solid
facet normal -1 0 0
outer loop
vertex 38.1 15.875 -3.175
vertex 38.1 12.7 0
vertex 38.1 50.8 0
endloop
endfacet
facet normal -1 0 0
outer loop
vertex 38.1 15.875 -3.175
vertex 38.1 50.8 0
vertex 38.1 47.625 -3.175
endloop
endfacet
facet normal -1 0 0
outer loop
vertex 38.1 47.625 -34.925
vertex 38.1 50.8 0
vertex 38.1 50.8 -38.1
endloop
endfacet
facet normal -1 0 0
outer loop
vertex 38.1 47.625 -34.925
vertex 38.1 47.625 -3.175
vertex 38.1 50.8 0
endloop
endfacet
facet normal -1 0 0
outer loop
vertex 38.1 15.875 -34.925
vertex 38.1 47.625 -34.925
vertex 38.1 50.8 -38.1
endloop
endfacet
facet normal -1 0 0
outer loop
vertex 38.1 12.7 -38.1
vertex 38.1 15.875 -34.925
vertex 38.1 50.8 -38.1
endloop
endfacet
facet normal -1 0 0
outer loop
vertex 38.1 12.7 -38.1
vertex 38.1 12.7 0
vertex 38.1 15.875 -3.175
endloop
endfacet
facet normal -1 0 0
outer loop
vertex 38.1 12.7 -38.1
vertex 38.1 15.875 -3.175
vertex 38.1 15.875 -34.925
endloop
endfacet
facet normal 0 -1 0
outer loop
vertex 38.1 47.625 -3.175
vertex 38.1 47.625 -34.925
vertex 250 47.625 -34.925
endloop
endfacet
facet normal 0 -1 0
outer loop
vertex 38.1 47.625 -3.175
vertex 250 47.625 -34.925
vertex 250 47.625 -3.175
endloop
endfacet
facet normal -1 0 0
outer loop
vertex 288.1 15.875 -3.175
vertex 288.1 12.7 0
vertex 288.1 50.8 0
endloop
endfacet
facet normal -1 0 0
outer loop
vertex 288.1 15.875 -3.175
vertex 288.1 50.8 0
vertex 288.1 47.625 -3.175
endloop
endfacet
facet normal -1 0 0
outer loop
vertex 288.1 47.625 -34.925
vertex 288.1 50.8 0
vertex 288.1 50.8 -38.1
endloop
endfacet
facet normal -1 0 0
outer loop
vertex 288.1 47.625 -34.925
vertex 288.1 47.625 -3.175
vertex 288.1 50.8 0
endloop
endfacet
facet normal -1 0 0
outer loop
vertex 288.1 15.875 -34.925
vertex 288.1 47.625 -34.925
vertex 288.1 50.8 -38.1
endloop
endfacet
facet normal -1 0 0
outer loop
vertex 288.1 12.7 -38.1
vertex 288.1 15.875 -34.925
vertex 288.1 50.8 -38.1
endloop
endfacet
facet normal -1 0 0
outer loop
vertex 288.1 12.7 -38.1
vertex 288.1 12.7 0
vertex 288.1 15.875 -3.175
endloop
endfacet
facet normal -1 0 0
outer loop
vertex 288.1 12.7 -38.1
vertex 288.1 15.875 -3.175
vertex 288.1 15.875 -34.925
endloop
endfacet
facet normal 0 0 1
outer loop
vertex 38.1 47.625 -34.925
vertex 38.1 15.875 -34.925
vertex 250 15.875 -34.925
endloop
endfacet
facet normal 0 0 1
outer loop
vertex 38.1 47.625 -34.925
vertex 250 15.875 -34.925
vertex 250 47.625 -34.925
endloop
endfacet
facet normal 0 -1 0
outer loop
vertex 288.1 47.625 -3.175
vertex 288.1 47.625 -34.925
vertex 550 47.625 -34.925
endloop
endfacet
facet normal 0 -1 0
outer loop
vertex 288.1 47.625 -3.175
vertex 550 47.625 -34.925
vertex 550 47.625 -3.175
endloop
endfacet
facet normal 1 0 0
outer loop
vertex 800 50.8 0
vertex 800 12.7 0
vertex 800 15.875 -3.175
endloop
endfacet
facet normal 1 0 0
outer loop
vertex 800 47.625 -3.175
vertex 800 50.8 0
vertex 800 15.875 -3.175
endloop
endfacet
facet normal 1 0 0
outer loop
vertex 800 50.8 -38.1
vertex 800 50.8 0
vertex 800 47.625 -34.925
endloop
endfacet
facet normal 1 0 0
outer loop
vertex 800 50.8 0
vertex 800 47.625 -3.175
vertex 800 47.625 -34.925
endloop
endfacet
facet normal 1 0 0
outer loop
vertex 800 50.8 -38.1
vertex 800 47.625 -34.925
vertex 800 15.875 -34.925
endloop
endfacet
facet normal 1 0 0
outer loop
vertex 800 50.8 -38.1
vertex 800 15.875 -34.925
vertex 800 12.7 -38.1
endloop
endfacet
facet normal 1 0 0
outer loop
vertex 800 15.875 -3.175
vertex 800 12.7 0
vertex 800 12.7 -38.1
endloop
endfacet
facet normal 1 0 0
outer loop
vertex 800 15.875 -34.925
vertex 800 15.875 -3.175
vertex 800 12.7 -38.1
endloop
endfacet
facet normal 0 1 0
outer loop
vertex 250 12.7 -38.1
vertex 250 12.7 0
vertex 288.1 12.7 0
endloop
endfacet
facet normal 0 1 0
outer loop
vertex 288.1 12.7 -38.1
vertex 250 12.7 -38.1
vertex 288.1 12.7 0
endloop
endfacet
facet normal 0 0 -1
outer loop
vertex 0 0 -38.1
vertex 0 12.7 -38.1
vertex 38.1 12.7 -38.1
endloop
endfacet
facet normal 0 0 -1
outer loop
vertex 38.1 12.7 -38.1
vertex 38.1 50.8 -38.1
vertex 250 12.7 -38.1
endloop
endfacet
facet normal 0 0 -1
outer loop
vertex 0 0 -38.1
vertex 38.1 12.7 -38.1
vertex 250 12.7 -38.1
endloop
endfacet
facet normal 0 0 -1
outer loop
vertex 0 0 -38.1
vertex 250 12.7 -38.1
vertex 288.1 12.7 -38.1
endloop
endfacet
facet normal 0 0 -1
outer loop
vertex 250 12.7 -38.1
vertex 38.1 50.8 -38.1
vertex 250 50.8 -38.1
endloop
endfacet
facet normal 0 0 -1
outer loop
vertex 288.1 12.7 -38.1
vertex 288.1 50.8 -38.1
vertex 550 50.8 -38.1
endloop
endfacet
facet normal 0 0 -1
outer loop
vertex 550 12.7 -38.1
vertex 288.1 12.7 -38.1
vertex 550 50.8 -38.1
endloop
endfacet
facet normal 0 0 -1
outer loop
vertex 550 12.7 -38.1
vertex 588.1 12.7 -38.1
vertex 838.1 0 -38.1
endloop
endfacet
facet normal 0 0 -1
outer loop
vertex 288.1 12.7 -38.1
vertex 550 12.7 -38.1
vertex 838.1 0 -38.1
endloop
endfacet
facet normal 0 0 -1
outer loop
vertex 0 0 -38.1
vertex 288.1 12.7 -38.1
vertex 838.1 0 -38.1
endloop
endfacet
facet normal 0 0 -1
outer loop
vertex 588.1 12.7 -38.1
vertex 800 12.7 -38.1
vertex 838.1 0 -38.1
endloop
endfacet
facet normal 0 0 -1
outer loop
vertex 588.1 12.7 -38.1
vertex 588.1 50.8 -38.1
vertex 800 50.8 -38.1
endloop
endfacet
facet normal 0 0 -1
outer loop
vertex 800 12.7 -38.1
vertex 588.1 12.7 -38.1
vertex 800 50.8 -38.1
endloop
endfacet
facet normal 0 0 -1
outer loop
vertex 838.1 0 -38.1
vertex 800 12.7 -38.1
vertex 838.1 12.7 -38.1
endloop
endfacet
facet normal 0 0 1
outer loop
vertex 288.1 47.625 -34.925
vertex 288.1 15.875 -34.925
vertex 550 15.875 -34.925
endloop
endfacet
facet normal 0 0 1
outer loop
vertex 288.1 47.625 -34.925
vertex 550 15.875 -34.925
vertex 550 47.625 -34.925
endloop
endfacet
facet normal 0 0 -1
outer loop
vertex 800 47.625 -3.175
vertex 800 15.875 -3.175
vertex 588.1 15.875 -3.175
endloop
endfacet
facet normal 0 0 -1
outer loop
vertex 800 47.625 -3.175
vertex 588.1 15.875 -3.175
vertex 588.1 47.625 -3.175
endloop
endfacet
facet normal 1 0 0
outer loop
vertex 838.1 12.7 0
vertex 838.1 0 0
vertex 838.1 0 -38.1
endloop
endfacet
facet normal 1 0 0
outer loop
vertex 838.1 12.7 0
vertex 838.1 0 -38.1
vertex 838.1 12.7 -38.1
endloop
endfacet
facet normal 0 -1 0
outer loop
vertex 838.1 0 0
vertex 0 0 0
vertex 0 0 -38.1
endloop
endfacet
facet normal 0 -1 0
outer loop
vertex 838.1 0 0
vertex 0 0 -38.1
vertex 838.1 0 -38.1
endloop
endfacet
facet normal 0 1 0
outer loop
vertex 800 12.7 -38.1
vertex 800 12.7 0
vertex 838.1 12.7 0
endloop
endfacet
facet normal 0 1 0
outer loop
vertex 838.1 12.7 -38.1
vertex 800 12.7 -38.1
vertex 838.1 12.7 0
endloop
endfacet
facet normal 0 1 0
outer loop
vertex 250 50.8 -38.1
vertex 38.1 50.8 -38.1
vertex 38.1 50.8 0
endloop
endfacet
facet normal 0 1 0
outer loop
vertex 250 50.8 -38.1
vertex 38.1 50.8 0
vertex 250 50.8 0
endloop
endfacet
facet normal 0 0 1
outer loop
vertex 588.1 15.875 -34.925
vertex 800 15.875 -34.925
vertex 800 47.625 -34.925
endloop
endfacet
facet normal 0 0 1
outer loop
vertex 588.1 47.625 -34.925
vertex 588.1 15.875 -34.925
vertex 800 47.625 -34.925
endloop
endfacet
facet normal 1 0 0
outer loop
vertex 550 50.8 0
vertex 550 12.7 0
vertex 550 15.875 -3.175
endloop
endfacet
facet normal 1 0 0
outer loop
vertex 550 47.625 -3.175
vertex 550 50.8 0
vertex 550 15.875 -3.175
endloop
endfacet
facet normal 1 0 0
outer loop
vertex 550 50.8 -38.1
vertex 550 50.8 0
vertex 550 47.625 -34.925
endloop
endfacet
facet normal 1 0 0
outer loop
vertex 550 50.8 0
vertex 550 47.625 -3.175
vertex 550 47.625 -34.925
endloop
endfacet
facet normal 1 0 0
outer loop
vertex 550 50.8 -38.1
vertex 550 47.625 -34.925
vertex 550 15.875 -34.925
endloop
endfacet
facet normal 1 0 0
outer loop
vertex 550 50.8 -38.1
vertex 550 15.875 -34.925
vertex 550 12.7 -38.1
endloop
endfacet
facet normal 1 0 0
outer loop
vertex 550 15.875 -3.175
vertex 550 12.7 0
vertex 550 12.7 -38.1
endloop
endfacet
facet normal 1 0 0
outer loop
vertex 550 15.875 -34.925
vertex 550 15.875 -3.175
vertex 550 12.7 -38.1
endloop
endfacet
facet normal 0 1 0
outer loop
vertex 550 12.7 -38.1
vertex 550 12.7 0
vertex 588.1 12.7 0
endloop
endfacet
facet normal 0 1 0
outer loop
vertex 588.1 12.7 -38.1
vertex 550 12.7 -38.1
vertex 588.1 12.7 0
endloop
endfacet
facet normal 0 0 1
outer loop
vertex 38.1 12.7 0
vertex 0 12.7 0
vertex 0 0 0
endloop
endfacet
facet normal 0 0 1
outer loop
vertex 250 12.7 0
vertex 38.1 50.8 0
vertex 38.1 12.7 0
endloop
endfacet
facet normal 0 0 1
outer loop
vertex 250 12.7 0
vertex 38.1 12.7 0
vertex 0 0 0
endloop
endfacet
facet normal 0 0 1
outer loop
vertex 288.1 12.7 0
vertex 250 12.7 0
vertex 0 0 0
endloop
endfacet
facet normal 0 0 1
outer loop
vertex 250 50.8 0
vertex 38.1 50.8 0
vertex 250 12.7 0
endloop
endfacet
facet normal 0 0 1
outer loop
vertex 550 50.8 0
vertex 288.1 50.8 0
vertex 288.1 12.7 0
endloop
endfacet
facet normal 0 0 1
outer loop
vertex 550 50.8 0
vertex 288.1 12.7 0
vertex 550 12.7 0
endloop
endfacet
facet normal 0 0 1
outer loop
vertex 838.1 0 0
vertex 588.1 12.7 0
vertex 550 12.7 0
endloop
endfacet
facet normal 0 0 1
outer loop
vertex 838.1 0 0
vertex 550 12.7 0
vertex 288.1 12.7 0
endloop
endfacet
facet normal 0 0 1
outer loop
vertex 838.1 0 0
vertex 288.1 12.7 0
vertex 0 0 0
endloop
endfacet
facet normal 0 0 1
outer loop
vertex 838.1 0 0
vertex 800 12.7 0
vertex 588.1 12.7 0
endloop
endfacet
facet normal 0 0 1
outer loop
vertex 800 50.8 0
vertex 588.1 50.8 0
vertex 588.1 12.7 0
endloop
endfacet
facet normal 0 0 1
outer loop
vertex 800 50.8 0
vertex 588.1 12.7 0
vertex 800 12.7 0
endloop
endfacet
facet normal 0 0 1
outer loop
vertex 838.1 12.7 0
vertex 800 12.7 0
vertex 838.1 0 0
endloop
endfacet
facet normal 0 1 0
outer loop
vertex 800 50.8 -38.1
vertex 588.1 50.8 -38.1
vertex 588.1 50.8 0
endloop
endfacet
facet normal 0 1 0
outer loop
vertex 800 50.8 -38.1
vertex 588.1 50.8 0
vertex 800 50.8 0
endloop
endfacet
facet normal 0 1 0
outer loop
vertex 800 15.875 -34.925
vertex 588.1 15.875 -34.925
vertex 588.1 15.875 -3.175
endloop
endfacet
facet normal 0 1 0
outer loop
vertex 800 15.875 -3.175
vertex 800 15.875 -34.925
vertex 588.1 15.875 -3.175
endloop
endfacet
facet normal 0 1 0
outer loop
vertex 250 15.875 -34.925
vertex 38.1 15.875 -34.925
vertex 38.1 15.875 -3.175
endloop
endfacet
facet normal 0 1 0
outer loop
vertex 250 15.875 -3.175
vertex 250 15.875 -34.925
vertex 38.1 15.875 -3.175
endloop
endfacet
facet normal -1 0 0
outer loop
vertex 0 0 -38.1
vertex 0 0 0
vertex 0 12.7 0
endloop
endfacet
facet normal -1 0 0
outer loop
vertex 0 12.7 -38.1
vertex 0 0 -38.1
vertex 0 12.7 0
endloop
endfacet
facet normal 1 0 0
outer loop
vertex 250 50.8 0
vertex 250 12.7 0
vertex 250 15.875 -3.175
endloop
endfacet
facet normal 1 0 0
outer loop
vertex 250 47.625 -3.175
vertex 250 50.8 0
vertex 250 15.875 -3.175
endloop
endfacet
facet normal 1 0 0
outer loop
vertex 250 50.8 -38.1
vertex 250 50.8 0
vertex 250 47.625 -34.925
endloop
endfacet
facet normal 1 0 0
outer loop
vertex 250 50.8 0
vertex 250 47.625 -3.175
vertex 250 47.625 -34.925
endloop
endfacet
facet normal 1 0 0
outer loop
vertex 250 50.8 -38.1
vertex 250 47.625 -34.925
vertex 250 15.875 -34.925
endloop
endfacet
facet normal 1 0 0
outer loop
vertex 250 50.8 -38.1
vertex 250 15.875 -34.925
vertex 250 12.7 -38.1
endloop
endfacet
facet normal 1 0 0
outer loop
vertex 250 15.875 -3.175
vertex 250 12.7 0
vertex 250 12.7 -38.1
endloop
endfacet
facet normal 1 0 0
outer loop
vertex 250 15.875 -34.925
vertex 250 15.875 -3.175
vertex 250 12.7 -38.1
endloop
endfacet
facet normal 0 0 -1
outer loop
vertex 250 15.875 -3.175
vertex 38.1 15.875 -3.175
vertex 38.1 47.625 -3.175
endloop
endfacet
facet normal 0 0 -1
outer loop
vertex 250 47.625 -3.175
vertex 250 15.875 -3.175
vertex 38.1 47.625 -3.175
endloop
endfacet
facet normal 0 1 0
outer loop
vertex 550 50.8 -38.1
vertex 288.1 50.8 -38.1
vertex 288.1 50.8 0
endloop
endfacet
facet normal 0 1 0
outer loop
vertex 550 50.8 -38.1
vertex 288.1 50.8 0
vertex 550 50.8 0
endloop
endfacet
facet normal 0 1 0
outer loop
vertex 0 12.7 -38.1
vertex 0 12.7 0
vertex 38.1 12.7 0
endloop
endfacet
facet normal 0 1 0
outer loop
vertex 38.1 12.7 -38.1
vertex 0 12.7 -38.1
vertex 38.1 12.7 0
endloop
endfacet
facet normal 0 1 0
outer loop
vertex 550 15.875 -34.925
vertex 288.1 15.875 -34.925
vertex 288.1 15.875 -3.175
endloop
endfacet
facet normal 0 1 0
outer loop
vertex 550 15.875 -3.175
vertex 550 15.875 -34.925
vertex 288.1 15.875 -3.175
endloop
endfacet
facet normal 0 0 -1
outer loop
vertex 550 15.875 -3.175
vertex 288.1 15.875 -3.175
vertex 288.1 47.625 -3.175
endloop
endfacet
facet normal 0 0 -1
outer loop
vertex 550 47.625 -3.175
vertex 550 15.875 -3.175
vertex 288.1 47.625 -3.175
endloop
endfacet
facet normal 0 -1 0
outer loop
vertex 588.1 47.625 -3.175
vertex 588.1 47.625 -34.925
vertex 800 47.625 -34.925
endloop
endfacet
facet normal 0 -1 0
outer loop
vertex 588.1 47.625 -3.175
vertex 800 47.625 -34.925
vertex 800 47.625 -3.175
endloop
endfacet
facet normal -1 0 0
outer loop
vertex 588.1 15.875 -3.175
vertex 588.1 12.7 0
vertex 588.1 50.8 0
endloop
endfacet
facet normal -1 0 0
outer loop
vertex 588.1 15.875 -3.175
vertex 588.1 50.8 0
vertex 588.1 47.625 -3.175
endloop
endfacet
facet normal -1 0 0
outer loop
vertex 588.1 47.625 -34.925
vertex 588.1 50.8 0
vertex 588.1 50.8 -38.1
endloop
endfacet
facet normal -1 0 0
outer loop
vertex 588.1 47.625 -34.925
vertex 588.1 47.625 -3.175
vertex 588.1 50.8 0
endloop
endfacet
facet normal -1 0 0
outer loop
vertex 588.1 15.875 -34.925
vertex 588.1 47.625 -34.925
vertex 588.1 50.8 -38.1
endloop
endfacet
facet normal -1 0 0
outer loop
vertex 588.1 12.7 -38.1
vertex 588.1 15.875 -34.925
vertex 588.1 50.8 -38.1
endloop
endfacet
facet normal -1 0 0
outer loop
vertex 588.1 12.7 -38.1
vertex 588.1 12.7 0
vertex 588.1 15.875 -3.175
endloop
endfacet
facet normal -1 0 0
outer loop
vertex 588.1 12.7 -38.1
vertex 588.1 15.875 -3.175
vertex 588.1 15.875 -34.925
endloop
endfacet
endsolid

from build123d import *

# Parameters (mm, degrees)
SKETCH1_W           = 838.1
SKETCH1_H           = 12.7
BOSS_EXTRUDE1_DEPTH = 38.1
SKETCH2_W           = 211.9
SKETCH2_H           = 38.1
SKETCH2_W_2         = 261.9
BOSS_EXTRUDE2_DEPTH = 38.1
SKETCH6_W           = 31.75
SKETCH6_H           = 31.75
CUT_EXTRUDE2_DEPTH  = 801


with BuildPart() as part:
    # Sketch1 → Boss-Extrude1 (new body)
    with BuildSketch(Plane.XY):
        with Locations((419.05, 6.35)):
            Rectangle(SKETCH1_W, SKETCH1_H)
    extrude(amount=-BOSS_EXTRUDE1_DEPTH)

    # Sketch2 → Boss-Extrude2 (add)
    with BuildSketch(Plane(origin=(0, 12.7, 0), x_dir=(1, 0, 0), z_dir=(0, 1, 0))):
        with Locations((144.05, 19.05)):
            Rectangle(SKETCH2_W, SKETCH2_H)
        with Locations((419.05, 19.05)):
            Rectangle(SKETCH2_W_2, SKETCH2_H)
        with Locations((694.05, 19.05)):
            Rectangle(SKETCH2_W, SKETCH2_H)
    extrude(amount=BOSS_EXTRUDE2_DEPTH)

    # Sketch6 → Cut-Extrude2 (cut, through all)
    with BuildSketch(Plane.ZY.offset(-38.1)):
        with Locations((-19.05, 31.75)):
            Rectangle(SKETCH6_W, SKETCH6_H)
    extrude(amount=-CUT_EXTRUDE2_DEPTH, mode=Mode.SUBTRACT)


solid = part.part
